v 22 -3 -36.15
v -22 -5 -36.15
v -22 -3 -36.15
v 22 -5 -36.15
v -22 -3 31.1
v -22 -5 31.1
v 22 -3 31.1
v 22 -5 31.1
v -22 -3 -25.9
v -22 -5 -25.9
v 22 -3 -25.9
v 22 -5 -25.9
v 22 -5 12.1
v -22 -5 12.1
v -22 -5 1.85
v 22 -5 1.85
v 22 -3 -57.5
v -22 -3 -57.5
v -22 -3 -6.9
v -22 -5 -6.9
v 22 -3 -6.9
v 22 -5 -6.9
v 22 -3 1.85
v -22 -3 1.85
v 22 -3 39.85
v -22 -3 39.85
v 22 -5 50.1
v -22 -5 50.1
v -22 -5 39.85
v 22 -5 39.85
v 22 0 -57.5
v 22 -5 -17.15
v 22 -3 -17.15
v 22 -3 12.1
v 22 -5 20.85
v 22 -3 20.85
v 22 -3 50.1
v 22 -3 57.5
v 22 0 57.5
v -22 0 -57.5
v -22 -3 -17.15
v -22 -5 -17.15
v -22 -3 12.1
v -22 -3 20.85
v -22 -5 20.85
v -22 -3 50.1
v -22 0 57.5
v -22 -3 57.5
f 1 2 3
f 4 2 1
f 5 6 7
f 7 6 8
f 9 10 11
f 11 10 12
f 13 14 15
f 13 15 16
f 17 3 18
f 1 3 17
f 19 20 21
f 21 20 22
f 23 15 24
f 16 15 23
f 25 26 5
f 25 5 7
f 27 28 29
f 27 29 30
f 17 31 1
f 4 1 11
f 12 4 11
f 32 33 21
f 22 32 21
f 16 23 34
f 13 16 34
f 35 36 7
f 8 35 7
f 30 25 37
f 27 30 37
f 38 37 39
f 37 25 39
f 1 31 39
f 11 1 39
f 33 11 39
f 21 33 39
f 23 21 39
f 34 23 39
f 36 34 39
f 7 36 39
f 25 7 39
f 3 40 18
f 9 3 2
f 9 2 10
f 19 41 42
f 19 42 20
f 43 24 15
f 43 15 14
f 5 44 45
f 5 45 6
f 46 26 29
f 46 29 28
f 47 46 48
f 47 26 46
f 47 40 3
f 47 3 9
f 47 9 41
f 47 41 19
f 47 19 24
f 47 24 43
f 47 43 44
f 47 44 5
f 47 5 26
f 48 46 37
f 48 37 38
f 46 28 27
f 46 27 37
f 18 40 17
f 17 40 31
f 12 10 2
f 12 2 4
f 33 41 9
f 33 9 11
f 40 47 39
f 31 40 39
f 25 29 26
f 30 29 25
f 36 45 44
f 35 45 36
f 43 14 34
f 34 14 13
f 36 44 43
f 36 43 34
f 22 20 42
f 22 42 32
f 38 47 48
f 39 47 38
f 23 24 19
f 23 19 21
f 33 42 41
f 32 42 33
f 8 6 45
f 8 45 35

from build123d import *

# Parameters (mm, degrees)
F0_W     = 44
F0_H     = 115
F1_DEPTH = 5
F5_W     = 2
F5_H     = 7.4
F6_DEPTH = 44.001
F7_W     = 44
F7_H     = 8.75
F7_H_2   = 21.35
F8_DEPTH = 2


with BuildPart() as f1:
    # F0 (on Front) → F1 (new body)
    with BuildSketch(Plane.XZ):
        Rectangle(F0_W, F0_H)
    extrude(amount=F1_DEPTH)

    # F5 (on face) → F6 (cut, through all)
    with BuildSketch(Plane.YZ.offset(22)):
        with Locations((-4, 53.8)):
            Rectangle(F5_W, F5_H)
    extrude(amount=-F6_DEPTH, mode=Mode.SUBTRACT)

    # F7 (on face) → F8 (cut)
    with BuildSketch(Plane.XZ.offset(5)):
        with Locations((0, 35.475)):
            Rectangle(F7_W, F7_H)
        with Locations((0, 16.475)):
            Rectangle(F7_W, F7_H)
        with Locations((0, -2.525)):
            Rectangle(F7_W, F7_H)
        with Locations((0, -21.525)):
            Rectangle(F7_W, F7_H)
        with Locations((0, -46.825)):
            Rectangle(F7_W, F7_H_2)
    extrude(amount=-F8_DEPTH, mode=Mode.SUBTRACT)


solid = f1.part
